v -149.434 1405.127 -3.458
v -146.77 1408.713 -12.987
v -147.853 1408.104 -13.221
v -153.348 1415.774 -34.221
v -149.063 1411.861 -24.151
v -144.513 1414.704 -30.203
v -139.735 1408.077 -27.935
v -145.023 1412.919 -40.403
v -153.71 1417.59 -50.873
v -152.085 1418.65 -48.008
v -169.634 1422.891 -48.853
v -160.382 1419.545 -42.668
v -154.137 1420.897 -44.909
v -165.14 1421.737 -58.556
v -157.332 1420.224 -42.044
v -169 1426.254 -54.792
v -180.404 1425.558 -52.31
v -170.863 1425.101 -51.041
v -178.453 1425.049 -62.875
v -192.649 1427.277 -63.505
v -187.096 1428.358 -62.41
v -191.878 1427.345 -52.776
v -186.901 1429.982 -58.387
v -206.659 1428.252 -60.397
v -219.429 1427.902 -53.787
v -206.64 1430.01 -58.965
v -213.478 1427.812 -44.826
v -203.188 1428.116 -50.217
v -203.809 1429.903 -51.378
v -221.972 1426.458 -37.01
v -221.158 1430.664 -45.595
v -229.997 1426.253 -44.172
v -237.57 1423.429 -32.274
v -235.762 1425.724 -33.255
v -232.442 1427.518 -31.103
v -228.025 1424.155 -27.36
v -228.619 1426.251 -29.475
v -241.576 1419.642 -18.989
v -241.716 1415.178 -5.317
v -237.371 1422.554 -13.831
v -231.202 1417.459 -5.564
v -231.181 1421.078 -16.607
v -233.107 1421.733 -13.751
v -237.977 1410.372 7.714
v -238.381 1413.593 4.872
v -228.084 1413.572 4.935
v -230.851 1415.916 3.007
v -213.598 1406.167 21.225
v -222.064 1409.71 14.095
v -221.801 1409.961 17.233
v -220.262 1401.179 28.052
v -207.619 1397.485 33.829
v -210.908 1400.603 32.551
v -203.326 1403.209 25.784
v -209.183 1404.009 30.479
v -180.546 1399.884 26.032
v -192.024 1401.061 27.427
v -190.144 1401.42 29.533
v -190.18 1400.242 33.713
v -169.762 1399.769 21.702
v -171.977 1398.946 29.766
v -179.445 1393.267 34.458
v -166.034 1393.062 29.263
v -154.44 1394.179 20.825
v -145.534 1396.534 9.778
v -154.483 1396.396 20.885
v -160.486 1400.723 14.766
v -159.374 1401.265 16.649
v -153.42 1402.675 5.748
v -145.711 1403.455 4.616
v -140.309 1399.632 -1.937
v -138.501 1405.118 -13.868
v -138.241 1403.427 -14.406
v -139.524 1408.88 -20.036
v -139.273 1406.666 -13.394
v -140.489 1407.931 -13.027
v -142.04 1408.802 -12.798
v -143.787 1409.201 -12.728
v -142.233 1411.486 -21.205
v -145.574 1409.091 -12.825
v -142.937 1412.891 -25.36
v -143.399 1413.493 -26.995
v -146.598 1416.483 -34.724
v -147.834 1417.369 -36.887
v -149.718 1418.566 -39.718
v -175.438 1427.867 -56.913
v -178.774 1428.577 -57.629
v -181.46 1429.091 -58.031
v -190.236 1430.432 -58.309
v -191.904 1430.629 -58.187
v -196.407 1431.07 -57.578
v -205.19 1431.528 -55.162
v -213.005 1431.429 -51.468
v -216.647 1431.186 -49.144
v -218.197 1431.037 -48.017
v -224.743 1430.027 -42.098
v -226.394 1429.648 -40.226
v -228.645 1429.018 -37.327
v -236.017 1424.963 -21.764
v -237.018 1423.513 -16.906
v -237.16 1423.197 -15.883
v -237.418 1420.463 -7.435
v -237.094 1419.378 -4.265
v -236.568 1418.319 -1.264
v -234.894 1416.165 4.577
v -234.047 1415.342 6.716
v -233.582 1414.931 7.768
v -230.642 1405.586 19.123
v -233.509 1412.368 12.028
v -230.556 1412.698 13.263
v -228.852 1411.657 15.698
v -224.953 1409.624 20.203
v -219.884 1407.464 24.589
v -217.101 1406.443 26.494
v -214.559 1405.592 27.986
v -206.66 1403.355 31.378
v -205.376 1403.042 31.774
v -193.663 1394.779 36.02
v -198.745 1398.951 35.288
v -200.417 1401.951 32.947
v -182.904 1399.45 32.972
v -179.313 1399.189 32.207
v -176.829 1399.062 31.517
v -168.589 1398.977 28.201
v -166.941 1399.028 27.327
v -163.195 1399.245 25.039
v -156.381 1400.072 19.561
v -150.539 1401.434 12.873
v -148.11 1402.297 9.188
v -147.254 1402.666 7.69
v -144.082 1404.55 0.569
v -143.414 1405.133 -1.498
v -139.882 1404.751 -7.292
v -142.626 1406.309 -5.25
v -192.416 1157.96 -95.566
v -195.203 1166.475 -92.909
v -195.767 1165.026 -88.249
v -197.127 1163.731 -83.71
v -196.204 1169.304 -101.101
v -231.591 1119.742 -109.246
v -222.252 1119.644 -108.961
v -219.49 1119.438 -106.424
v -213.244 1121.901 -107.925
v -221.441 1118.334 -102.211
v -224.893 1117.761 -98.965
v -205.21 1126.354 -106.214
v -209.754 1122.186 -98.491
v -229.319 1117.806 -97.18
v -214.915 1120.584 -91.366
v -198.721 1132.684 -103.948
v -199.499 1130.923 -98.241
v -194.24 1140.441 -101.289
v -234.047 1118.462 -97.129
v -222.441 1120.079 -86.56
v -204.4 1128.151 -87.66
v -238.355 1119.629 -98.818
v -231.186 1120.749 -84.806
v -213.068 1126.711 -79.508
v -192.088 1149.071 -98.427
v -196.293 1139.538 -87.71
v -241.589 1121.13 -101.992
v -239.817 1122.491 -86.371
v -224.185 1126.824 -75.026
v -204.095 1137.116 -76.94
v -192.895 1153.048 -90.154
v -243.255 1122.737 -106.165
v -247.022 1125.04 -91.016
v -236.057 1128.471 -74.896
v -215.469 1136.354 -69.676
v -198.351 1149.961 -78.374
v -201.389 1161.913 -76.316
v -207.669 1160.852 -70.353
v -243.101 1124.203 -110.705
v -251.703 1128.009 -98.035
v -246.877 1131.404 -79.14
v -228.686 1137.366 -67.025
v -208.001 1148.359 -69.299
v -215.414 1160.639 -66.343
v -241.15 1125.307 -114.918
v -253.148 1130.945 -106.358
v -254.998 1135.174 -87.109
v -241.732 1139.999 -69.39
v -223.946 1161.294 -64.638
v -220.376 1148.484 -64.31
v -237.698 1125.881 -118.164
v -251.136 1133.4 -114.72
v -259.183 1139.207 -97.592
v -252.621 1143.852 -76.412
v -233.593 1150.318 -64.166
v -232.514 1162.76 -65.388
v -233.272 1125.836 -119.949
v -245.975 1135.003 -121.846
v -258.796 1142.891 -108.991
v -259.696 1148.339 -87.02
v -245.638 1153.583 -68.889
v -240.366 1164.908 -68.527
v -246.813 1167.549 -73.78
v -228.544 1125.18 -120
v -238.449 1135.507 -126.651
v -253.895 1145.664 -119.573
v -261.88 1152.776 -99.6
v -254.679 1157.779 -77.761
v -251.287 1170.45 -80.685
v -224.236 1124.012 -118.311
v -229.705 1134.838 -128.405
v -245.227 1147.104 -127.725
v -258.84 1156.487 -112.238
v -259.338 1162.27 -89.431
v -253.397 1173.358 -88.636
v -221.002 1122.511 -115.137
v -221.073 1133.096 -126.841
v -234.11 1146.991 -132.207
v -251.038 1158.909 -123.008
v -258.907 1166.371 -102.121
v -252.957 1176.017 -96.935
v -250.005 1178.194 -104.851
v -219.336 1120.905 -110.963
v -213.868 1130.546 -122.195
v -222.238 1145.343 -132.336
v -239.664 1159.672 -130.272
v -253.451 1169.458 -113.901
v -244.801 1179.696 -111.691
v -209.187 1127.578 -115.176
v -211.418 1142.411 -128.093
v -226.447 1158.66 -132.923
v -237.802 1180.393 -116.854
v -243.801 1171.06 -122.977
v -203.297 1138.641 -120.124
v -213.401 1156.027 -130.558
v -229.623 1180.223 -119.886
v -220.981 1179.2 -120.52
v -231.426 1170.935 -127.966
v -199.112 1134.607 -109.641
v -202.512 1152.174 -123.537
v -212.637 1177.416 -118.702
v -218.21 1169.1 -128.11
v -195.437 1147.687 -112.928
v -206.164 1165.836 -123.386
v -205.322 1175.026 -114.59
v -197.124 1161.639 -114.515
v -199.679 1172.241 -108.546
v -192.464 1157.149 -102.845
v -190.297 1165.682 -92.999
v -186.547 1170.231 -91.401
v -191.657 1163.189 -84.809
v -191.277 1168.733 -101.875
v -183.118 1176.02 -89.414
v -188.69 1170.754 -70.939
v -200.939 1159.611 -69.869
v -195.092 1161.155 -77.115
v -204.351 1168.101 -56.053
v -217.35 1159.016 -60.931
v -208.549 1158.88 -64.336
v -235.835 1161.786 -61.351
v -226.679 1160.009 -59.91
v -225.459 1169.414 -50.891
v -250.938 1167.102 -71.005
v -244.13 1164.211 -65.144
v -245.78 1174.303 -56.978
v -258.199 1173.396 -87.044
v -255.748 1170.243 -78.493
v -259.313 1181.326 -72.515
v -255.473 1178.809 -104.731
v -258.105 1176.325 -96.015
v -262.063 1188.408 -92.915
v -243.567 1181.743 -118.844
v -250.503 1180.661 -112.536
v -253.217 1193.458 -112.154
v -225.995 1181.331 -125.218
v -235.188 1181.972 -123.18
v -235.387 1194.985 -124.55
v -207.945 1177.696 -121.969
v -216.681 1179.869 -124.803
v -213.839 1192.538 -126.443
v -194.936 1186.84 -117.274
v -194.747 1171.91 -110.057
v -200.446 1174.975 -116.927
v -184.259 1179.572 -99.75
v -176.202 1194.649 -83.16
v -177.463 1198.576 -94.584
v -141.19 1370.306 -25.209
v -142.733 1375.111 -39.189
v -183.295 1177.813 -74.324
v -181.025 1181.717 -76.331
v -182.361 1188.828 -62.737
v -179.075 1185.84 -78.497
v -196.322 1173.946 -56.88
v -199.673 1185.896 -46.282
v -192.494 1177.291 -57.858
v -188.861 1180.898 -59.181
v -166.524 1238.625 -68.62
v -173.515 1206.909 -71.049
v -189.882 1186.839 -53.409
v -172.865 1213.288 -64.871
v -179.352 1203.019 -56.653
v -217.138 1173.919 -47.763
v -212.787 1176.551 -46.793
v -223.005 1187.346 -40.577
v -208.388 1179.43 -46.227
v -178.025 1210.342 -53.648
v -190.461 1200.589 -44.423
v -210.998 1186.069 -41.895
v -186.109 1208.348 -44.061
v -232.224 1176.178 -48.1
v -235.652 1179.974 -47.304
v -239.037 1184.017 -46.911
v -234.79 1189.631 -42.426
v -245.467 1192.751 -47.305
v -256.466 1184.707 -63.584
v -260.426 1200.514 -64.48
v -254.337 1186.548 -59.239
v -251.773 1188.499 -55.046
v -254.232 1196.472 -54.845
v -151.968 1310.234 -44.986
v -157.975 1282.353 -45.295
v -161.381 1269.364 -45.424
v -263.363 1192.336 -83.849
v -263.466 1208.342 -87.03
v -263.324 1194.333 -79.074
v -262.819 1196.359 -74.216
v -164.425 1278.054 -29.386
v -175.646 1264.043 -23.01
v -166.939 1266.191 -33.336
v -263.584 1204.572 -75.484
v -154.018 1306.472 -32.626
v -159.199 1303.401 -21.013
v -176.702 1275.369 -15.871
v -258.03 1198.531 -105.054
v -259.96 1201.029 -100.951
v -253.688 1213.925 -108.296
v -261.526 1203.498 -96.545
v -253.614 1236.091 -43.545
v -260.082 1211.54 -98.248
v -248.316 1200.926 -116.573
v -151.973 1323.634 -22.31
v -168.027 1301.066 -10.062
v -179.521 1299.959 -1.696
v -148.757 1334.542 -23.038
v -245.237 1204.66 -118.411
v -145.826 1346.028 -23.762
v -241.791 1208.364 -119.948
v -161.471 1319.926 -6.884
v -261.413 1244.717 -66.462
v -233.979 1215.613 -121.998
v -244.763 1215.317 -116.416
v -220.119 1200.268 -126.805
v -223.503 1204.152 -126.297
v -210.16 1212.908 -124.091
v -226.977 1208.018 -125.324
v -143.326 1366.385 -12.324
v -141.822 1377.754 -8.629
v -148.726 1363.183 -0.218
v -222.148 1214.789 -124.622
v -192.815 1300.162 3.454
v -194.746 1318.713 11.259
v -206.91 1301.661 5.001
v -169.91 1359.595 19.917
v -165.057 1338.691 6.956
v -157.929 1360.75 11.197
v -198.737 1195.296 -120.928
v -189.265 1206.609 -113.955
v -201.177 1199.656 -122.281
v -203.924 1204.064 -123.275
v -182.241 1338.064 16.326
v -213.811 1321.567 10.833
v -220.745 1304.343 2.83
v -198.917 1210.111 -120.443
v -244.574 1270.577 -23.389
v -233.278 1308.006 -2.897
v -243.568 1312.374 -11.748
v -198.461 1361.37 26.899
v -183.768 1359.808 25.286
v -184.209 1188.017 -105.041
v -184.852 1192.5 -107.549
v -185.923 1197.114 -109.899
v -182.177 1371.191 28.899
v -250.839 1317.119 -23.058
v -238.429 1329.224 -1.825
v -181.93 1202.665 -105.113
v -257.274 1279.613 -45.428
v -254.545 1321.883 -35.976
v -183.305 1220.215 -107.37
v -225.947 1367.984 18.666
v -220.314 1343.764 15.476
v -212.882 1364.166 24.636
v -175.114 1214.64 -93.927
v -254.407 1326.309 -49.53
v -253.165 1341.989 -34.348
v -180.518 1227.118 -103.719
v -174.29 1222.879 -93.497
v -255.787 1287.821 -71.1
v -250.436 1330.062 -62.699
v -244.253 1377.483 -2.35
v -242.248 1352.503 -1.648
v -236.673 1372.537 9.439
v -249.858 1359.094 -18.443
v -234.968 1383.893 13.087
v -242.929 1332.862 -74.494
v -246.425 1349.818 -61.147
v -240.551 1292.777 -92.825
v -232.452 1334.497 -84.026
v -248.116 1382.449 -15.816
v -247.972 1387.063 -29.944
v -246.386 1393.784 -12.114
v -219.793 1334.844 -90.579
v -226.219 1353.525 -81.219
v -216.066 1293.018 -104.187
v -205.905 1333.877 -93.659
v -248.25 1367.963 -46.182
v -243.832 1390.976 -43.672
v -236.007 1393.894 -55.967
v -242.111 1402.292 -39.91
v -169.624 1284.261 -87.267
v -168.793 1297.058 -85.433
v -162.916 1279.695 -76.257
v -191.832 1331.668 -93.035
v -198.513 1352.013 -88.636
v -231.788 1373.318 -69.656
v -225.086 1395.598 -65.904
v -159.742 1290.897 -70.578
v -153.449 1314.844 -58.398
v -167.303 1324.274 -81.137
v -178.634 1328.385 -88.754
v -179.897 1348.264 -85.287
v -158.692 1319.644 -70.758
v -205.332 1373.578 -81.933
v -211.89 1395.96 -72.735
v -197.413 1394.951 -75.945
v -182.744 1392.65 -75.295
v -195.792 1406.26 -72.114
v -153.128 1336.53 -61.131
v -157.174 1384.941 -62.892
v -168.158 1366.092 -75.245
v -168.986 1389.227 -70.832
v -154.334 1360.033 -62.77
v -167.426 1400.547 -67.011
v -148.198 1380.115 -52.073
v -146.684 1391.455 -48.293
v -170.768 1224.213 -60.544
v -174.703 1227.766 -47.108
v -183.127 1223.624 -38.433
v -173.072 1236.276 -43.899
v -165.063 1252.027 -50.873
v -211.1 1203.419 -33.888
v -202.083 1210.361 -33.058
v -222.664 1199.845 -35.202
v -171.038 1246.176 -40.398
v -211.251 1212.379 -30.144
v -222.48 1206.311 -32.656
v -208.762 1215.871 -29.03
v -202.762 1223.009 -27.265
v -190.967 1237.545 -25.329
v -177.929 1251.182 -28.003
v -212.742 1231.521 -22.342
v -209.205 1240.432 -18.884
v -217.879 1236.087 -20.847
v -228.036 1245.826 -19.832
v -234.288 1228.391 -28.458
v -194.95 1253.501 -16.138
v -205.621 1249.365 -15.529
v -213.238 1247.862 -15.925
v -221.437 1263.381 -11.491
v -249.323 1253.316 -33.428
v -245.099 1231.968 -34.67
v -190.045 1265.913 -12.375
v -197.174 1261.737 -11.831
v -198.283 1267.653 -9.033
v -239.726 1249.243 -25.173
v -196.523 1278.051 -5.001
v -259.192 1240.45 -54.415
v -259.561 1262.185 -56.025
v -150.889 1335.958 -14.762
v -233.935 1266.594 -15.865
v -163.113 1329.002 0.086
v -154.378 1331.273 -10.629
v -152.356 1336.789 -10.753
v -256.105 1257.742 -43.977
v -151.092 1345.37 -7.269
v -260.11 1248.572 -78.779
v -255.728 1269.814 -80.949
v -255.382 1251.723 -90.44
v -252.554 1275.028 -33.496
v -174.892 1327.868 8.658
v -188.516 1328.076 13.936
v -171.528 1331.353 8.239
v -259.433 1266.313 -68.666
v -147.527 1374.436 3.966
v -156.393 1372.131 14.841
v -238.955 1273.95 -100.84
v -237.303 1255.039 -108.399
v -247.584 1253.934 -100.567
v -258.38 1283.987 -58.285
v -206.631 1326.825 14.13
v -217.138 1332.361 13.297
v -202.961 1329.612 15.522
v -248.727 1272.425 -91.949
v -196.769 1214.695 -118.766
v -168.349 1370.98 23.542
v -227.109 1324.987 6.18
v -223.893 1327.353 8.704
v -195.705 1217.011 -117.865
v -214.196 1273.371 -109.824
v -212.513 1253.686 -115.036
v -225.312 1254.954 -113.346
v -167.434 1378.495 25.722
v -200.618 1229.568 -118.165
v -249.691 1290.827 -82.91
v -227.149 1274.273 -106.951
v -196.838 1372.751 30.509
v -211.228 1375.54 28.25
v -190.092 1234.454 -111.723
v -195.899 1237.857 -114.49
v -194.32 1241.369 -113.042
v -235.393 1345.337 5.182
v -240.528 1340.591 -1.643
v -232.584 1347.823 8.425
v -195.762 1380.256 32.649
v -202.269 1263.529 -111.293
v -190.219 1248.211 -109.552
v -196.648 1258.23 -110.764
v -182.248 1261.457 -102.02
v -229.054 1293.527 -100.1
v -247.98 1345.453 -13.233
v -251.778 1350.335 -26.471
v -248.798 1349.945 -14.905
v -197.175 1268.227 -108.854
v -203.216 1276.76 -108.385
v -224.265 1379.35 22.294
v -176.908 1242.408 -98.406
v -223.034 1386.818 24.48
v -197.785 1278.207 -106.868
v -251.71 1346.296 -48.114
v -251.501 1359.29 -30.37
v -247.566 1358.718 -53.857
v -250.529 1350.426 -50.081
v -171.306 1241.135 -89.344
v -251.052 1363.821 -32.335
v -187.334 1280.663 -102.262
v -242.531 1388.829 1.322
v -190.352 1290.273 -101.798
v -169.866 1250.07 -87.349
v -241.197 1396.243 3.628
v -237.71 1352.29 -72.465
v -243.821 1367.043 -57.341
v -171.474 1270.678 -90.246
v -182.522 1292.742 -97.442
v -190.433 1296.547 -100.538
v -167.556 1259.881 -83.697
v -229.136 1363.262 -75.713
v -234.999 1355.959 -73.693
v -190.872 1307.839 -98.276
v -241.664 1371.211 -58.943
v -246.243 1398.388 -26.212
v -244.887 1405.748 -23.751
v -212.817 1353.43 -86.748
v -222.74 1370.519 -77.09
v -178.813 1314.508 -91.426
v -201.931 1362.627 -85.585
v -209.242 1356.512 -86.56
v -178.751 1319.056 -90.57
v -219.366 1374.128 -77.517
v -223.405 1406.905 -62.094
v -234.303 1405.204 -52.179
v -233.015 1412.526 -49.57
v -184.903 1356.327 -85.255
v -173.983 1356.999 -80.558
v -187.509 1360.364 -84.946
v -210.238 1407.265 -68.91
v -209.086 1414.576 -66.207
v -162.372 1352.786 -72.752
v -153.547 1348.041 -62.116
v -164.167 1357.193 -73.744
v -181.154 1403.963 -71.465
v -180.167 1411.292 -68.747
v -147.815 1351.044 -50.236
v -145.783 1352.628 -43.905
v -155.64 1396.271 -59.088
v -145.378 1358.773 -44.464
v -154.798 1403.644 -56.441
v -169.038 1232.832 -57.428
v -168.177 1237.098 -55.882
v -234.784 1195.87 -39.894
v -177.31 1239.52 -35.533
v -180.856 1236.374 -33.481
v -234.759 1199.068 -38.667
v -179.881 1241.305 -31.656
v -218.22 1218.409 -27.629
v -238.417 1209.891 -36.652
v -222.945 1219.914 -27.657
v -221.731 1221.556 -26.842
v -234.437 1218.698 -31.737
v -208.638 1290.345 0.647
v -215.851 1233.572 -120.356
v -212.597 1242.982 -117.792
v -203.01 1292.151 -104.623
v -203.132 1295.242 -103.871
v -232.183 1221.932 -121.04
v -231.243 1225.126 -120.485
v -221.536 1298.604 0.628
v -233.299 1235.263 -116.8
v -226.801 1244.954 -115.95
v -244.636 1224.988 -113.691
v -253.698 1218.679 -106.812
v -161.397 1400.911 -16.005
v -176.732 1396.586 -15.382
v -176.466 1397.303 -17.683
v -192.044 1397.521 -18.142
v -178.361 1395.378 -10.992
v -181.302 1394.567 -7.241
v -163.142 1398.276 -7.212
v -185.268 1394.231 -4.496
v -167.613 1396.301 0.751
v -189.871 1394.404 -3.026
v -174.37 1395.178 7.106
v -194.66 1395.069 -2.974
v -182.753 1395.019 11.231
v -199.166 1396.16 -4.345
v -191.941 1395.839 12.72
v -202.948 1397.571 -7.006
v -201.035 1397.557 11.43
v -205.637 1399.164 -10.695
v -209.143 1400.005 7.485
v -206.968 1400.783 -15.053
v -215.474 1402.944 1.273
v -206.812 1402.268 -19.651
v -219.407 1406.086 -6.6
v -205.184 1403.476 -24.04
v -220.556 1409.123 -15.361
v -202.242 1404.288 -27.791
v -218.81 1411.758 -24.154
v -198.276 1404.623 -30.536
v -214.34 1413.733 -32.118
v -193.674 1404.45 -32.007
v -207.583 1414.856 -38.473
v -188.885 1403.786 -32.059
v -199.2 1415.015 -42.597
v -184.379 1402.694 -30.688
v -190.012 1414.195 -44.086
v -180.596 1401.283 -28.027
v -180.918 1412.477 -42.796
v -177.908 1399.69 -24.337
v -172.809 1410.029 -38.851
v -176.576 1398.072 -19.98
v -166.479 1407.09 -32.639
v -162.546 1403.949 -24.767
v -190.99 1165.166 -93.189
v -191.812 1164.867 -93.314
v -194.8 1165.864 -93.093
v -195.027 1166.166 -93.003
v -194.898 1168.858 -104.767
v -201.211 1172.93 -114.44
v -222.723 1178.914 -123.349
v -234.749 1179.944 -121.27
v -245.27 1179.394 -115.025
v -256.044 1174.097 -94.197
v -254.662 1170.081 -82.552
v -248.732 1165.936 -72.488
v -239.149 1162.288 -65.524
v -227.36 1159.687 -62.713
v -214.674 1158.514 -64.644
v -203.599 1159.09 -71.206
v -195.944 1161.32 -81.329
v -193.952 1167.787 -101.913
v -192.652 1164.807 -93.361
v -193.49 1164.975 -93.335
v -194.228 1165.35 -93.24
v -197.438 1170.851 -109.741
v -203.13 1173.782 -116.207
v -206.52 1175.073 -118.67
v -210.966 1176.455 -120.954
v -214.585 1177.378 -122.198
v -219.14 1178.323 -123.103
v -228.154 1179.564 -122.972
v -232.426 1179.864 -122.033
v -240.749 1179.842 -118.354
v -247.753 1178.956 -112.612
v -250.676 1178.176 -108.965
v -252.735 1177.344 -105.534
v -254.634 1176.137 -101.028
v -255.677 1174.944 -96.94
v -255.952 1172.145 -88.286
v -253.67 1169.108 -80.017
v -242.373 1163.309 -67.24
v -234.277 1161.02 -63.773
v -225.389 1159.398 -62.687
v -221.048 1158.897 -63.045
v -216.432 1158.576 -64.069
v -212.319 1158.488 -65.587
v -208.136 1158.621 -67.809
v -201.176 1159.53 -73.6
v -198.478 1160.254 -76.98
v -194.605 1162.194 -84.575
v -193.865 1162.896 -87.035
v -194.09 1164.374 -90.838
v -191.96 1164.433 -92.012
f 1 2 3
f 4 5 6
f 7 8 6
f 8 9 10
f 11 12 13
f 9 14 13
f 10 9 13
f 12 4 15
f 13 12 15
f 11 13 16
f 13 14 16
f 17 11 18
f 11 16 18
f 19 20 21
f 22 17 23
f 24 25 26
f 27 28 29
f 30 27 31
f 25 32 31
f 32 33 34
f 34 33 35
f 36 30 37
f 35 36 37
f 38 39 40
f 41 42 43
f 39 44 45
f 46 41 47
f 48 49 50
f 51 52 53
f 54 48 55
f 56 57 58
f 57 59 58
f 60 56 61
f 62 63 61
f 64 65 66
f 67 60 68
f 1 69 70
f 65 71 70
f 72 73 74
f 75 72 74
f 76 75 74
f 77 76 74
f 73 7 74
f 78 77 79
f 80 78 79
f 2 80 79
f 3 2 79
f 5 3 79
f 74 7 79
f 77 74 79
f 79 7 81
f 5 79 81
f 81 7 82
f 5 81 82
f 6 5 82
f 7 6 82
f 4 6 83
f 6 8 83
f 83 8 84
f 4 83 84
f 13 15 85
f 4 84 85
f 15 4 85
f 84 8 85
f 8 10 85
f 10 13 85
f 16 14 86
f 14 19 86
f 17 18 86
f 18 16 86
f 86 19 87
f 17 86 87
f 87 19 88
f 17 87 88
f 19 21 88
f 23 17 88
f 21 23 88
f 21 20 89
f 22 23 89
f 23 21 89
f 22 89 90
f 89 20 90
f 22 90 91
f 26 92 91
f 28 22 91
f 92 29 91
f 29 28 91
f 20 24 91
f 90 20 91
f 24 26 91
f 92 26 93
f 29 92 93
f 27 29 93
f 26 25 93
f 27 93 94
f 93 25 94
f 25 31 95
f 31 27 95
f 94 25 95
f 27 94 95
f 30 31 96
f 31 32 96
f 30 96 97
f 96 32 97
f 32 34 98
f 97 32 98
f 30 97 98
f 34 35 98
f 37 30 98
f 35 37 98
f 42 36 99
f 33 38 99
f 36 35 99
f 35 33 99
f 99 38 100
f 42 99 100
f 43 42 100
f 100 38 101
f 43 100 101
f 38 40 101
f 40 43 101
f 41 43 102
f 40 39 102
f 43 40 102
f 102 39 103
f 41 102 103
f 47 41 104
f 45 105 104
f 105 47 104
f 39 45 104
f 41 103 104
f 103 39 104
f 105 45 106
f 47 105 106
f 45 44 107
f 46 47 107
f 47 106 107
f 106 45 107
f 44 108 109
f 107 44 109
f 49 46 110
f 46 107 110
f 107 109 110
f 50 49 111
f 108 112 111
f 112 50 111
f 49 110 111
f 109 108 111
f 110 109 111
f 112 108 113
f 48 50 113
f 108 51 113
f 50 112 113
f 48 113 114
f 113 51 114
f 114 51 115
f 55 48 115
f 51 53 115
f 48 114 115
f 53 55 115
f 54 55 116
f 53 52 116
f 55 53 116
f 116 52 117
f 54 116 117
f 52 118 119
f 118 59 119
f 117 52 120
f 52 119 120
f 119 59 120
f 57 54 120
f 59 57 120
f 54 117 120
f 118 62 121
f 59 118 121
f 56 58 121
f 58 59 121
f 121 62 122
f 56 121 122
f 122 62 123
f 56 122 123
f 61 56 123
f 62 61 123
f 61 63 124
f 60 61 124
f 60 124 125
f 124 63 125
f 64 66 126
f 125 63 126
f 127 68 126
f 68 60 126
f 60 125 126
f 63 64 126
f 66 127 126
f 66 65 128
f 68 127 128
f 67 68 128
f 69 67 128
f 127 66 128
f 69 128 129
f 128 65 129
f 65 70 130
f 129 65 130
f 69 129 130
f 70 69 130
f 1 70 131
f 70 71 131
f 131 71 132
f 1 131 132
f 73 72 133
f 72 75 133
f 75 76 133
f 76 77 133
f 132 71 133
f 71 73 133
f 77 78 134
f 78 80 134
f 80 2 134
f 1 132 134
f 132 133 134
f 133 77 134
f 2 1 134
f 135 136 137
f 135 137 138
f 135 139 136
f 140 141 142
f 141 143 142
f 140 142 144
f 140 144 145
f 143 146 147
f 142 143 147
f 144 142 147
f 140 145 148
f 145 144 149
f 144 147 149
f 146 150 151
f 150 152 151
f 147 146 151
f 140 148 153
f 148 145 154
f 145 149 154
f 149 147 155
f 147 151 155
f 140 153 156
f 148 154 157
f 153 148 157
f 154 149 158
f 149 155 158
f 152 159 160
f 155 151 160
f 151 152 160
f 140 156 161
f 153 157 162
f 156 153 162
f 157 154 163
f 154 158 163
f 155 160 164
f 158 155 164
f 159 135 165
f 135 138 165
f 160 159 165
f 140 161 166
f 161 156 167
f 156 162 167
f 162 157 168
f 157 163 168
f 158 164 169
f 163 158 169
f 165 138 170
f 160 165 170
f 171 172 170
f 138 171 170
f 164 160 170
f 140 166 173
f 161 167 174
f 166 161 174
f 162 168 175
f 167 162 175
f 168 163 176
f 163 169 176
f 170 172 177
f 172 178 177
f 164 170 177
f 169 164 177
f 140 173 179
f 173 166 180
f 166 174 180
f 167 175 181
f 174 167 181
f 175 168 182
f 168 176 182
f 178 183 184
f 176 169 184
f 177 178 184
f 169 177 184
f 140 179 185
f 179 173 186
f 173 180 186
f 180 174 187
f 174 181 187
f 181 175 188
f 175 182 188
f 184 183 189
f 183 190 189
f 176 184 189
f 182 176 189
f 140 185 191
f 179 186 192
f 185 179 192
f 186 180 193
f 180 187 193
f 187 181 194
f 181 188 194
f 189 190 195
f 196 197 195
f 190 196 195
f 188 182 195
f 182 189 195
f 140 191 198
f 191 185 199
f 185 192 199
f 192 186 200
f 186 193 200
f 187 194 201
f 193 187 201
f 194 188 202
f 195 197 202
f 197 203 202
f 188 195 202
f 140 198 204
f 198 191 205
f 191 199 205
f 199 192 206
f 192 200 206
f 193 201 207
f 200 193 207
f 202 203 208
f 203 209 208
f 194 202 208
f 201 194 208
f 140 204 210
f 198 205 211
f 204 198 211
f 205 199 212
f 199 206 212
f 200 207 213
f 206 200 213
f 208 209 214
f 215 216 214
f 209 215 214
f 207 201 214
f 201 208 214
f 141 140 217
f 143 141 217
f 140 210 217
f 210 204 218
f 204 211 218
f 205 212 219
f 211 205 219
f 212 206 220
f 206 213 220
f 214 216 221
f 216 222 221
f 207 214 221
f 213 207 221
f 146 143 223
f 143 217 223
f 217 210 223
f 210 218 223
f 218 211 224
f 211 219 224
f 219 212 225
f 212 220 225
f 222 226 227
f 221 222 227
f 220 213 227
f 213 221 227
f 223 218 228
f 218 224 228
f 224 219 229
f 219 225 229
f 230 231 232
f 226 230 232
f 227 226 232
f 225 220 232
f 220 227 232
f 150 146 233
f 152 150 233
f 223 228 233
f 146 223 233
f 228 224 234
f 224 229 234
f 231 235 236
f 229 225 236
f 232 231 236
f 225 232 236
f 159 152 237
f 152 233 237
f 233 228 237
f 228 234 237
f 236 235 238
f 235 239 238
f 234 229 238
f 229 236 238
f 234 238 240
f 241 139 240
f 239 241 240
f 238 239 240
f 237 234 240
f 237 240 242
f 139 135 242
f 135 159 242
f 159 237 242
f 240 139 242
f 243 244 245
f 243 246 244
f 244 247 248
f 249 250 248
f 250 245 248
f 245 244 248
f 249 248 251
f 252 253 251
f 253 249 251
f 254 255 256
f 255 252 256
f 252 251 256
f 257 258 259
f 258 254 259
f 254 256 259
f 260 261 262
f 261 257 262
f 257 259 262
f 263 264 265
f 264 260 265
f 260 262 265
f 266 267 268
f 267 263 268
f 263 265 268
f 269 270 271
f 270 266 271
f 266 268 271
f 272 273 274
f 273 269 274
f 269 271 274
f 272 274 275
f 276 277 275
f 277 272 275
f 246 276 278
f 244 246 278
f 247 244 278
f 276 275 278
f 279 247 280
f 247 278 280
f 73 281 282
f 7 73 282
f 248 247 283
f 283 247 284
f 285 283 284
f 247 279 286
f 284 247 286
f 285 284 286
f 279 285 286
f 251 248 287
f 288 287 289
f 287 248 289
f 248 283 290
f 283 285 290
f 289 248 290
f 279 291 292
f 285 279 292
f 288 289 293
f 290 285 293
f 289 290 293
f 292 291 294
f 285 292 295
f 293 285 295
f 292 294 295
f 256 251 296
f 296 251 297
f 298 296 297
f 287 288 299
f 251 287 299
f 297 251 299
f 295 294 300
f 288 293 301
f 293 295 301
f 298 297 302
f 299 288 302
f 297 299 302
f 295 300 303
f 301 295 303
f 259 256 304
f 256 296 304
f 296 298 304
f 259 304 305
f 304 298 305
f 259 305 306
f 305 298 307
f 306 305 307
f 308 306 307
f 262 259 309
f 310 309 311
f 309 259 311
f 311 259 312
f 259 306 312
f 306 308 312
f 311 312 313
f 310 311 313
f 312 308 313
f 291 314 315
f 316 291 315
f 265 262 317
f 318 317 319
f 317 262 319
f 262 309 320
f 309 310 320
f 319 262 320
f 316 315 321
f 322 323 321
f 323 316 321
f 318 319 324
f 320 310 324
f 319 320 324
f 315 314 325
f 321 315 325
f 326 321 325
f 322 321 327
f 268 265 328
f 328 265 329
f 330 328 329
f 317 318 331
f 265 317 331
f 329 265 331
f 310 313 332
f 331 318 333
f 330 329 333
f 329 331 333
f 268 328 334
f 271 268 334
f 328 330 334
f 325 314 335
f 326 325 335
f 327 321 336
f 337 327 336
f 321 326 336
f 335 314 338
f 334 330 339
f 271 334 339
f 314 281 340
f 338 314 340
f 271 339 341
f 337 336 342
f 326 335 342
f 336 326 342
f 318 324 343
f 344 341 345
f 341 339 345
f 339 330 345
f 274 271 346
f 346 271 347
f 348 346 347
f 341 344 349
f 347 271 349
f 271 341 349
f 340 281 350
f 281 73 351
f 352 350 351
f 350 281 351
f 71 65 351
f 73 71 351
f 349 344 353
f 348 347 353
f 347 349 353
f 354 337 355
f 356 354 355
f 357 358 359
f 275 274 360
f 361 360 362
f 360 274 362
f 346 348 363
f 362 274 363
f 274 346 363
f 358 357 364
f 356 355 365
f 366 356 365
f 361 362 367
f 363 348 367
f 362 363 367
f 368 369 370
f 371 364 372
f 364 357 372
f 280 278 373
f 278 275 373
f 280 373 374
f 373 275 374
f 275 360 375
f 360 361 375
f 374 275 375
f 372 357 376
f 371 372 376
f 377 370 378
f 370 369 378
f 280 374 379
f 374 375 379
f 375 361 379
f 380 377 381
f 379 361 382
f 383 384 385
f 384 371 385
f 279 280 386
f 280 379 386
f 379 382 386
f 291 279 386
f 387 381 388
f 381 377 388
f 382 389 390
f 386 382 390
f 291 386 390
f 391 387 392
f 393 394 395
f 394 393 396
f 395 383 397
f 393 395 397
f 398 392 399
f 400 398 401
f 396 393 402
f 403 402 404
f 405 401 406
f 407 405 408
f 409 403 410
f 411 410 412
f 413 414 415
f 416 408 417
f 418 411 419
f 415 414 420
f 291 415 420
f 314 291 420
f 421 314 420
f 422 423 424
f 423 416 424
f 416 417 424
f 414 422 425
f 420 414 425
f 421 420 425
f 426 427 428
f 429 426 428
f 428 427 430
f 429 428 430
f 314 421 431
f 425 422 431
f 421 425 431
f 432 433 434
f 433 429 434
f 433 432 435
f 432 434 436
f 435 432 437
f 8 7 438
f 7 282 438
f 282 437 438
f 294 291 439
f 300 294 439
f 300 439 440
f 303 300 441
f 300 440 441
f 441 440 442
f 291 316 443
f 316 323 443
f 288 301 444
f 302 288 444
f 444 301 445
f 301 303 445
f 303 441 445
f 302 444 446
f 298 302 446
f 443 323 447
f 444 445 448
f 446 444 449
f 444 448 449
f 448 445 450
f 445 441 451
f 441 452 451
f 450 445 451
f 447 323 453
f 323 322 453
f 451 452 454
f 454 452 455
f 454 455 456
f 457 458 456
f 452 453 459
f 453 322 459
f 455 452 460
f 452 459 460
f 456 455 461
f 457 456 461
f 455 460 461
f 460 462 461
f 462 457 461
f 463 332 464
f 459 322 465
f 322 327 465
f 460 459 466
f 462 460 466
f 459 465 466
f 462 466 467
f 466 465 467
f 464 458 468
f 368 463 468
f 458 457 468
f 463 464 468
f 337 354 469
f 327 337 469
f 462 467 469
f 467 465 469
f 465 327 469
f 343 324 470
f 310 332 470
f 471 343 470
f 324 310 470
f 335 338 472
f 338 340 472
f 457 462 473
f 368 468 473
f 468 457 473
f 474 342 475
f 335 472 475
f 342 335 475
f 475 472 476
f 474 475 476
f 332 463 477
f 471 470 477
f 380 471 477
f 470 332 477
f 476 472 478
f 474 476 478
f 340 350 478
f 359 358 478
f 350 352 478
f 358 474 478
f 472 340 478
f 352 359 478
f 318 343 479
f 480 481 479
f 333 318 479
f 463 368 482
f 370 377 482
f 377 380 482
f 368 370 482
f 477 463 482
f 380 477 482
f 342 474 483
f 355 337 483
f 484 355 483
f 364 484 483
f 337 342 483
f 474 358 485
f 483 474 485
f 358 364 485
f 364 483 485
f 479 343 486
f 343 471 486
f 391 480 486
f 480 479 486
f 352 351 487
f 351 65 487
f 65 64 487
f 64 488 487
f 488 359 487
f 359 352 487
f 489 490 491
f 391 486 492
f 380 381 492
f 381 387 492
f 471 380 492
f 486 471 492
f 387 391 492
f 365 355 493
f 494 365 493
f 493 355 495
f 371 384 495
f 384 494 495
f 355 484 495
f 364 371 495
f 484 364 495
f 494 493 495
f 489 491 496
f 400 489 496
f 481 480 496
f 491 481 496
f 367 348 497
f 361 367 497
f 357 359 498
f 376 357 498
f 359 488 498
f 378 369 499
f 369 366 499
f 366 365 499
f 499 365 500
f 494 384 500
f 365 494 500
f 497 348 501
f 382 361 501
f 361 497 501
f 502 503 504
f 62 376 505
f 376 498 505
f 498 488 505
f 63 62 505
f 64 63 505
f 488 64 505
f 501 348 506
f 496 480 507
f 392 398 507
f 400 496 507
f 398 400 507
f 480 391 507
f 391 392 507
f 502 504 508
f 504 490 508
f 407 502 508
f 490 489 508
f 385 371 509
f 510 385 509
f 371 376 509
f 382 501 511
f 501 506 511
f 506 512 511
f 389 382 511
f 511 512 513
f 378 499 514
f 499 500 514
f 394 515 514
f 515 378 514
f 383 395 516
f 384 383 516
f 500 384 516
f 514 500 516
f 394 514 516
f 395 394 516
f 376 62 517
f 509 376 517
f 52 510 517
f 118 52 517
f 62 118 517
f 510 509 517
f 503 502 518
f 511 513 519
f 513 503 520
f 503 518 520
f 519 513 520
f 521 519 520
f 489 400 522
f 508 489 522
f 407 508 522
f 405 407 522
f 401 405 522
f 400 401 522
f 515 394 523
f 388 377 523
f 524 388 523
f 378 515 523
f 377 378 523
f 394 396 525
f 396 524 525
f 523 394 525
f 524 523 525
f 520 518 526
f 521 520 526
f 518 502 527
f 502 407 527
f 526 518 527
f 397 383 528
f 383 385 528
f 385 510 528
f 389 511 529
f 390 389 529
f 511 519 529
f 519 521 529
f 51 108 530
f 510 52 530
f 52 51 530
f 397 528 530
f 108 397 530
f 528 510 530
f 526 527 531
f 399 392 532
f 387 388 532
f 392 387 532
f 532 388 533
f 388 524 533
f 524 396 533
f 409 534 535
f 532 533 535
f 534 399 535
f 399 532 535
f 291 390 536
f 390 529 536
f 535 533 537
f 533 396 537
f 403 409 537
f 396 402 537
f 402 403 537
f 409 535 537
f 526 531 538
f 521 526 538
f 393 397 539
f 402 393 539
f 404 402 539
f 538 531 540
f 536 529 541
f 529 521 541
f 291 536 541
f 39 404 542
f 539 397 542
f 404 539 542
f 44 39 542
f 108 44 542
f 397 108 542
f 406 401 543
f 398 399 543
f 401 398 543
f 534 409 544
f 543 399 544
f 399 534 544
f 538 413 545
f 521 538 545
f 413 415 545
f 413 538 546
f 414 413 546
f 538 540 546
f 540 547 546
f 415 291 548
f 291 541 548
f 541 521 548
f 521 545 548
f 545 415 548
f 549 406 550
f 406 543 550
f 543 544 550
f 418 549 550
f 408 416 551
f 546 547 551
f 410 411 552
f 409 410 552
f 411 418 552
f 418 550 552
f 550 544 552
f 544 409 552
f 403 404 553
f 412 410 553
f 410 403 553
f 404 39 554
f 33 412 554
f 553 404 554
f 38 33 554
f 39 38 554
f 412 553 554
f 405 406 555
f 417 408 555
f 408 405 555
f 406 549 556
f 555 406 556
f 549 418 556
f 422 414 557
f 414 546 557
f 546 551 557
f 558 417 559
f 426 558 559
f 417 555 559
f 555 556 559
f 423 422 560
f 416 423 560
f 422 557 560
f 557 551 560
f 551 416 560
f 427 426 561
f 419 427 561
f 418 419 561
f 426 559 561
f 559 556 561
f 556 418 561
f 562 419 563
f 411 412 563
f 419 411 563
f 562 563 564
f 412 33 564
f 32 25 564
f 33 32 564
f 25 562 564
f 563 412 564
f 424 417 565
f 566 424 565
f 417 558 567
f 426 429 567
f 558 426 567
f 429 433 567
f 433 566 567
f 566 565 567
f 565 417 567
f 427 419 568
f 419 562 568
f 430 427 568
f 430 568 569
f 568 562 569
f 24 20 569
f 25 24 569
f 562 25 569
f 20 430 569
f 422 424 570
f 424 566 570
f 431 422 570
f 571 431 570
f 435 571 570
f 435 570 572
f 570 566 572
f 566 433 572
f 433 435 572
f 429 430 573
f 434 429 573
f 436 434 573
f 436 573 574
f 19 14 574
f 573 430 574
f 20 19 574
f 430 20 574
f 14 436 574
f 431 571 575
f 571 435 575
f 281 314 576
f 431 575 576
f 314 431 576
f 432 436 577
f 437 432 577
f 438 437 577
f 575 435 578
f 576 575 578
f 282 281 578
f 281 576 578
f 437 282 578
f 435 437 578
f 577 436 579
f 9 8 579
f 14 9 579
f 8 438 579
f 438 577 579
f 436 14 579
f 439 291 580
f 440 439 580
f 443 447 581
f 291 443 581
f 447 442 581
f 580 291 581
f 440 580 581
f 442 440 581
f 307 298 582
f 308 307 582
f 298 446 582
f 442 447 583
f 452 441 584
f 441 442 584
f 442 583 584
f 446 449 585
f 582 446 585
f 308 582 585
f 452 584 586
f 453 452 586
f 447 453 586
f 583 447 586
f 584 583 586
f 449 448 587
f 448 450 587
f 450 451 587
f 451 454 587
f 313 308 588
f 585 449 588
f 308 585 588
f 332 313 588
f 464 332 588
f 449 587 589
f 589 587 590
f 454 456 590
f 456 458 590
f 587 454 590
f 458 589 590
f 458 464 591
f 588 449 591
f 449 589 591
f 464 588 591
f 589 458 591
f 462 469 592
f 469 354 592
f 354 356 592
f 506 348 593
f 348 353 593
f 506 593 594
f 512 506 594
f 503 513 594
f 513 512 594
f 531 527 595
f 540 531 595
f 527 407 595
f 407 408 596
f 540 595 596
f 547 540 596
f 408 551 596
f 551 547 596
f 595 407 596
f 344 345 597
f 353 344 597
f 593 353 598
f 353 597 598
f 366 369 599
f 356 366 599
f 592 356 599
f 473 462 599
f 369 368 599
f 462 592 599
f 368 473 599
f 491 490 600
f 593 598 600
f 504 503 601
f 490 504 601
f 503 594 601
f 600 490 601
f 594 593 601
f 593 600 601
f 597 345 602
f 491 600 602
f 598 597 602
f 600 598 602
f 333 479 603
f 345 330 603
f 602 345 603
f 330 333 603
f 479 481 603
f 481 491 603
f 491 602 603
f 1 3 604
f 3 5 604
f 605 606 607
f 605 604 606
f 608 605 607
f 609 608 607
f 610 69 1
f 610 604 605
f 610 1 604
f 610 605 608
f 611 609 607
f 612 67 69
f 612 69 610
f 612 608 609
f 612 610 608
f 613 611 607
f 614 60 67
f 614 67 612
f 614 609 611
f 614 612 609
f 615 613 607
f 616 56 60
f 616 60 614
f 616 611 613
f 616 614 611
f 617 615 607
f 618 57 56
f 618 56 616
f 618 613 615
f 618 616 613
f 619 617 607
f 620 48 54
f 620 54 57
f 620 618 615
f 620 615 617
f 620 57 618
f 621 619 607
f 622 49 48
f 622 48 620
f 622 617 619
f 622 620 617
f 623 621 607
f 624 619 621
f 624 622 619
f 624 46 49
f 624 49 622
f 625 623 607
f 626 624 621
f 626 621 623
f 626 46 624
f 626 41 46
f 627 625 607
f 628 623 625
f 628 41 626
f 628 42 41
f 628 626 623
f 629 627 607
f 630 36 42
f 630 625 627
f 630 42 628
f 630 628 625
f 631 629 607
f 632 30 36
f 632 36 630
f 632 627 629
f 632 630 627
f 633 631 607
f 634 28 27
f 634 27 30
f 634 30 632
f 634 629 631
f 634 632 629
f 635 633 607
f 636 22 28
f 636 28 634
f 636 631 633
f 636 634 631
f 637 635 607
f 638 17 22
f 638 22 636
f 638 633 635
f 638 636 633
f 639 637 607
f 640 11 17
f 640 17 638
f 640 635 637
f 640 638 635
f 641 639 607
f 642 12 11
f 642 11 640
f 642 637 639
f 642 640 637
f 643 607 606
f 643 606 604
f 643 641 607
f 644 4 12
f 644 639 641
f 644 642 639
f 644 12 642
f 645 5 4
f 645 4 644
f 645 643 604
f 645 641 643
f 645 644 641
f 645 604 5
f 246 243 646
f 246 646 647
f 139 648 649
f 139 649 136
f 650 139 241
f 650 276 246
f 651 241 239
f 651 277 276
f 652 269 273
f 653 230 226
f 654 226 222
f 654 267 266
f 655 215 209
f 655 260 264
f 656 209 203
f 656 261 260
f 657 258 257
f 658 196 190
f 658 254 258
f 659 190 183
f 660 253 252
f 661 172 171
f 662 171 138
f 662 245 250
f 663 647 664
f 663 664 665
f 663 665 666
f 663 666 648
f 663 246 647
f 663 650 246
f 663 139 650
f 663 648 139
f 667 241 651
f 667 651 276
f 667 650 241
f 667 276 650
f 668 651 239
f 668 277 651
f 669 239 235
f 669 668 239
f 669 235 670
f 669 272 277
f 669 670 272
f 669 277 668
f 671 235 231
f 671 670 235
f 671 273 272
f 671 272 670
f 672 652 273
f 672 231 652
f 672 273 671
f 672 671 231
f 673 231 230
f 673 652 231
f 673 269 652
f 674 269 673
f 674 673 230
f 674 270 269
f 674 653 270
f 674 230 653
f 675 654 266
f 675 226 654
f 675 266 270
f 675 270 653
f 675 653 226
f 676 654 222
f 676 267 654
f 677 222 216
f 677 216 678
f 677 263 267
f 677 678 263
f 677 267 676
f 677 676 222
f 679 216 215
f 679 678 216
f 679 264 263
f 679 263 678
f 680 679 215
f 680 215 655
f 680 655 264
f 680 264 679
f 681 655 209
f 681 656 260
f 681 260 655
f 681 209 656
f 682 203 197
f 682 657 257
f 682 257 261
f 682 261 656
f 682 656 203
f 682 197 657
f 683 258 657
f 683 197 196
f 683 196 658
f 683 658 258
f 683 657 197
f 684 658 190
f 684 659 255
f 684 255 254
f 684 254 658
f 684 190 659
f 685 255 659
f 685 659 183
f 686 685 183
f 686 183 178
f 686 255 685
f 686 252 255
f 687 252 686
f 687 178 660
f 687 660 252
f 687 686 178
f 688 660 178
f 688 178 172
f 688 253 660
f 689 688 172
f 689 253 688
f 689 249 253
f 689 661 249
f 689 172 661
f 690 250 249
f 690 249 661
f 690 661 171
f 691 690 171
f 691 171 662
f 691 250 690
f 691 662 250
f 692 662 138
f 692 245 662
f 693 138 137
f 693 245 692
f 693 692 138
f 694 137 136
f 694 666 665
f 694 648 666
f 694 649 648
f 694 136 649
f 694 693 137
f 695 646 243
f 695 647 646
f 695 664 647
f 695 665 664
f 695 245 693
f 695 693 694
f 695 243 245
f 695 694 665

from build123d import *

# Parameters (mm, degrees)
FILLET091_R             = 6
FILLET092_R             = 3
BODY055_ROLL_ANGLE      = -0.64968
BODY055_PITCH_ANGLE     = 17.98866
BODY055_PLACEMENT_ANGLE = -98.102834


with BuildPart() as part:
    # Sketch185 → Revolution095 (revolve)
    with BuildSketch(Plane.XY):
        with BuildLine():
            Line((15.9442, 0), (306.848053, 0))
            add(Edge.make_bspline(
                [(306.848053, 0), (324.317413, 42.311157), (231.745069, 46.553256), (127.654996, 54.056504), (-18.918443, 56.908137), (15.9442, 0)],
                knots=[0, 0, 0, 0, 0.333333, 0.666667, 1, 1, 1, 1], degree=3))
        make_face()
    revolve(axis=Axis((0, 0, 0), (1, 0, 0)))

    # Sketch186 → Groove089 (revolve, cut)
    with BuildSketch(Plane.XY):
        with BuildLine():
            Line((-60, 0), (60, 0))
            ThreePointArc((60, 0), (0, 60), (-60, 0))
        make_face()
    revolve(axis=Axis((0, 0, 0), (1, 0, 0)), mode=Mode.SUBTRACT)

    # Fillet091
    fillet091_edges = [part.edges().sort_by_distance(p)[0] for p in [
        (33.106232, -50.039758, 0),
    ]]
    fillet(fillet091_edges, radius=FILLET091_R)

    # Sketch187 → Groove090 (revolve, cut)
    with BuildSketch(Plane.XY):
        with BuildLine():
            Line((285, 0), (355, 0))
            ThreePointArc((355, 0), (320, 35), (285, 0))
        make_face()
    revolve(axis=Axis((0, 0, 0), (1, 0, 0)), mode=Mode.SUBTRACT)

    # Fillet092
    fillet092_edges = [part.edges().sort_by_distance(p)[0] for p in [
        (304.668851, -31.463564, 0),
    ]]
    fillet(fillet092_edges, radius=FILLET092_R)

    # Sketch187 → Revolution096 (revolve)
    with BuildSketch(Plane.XY):
        with BuildLine():
            Line((285, 0), (355, 0))
            ThreePointArc((355, 0), (320, 35), (285, 0))
        make_face()
    revolve(axis=Axis((0, 0, 0), (1, 0, 0)))


with BuildPart() as part_1:
    # Body055 roll: moved
    add(part.part.rotate(Axis((0, 0, 0), (1, 0, 0)), BODY055_ROLL_ANGLE))


with BuildPart() as part_2:
    # Body055 pitch: moved
    add(part_1.part.rotate(Axis((0, 0, 0), (0, 1, 0)), BODY055_PITCH_ANGLE))


with BuildPart() as part_3:
    # Body055 placement: moved
    add(part_2.part.moved(Location((-184, 1454.018312, 0.388141))).rotate(Axis((-184, 1454.018312, 0.388141), (0, 0, 1)), BODY055_PLACEMENT_ANGLE))


solid = part_3.part
